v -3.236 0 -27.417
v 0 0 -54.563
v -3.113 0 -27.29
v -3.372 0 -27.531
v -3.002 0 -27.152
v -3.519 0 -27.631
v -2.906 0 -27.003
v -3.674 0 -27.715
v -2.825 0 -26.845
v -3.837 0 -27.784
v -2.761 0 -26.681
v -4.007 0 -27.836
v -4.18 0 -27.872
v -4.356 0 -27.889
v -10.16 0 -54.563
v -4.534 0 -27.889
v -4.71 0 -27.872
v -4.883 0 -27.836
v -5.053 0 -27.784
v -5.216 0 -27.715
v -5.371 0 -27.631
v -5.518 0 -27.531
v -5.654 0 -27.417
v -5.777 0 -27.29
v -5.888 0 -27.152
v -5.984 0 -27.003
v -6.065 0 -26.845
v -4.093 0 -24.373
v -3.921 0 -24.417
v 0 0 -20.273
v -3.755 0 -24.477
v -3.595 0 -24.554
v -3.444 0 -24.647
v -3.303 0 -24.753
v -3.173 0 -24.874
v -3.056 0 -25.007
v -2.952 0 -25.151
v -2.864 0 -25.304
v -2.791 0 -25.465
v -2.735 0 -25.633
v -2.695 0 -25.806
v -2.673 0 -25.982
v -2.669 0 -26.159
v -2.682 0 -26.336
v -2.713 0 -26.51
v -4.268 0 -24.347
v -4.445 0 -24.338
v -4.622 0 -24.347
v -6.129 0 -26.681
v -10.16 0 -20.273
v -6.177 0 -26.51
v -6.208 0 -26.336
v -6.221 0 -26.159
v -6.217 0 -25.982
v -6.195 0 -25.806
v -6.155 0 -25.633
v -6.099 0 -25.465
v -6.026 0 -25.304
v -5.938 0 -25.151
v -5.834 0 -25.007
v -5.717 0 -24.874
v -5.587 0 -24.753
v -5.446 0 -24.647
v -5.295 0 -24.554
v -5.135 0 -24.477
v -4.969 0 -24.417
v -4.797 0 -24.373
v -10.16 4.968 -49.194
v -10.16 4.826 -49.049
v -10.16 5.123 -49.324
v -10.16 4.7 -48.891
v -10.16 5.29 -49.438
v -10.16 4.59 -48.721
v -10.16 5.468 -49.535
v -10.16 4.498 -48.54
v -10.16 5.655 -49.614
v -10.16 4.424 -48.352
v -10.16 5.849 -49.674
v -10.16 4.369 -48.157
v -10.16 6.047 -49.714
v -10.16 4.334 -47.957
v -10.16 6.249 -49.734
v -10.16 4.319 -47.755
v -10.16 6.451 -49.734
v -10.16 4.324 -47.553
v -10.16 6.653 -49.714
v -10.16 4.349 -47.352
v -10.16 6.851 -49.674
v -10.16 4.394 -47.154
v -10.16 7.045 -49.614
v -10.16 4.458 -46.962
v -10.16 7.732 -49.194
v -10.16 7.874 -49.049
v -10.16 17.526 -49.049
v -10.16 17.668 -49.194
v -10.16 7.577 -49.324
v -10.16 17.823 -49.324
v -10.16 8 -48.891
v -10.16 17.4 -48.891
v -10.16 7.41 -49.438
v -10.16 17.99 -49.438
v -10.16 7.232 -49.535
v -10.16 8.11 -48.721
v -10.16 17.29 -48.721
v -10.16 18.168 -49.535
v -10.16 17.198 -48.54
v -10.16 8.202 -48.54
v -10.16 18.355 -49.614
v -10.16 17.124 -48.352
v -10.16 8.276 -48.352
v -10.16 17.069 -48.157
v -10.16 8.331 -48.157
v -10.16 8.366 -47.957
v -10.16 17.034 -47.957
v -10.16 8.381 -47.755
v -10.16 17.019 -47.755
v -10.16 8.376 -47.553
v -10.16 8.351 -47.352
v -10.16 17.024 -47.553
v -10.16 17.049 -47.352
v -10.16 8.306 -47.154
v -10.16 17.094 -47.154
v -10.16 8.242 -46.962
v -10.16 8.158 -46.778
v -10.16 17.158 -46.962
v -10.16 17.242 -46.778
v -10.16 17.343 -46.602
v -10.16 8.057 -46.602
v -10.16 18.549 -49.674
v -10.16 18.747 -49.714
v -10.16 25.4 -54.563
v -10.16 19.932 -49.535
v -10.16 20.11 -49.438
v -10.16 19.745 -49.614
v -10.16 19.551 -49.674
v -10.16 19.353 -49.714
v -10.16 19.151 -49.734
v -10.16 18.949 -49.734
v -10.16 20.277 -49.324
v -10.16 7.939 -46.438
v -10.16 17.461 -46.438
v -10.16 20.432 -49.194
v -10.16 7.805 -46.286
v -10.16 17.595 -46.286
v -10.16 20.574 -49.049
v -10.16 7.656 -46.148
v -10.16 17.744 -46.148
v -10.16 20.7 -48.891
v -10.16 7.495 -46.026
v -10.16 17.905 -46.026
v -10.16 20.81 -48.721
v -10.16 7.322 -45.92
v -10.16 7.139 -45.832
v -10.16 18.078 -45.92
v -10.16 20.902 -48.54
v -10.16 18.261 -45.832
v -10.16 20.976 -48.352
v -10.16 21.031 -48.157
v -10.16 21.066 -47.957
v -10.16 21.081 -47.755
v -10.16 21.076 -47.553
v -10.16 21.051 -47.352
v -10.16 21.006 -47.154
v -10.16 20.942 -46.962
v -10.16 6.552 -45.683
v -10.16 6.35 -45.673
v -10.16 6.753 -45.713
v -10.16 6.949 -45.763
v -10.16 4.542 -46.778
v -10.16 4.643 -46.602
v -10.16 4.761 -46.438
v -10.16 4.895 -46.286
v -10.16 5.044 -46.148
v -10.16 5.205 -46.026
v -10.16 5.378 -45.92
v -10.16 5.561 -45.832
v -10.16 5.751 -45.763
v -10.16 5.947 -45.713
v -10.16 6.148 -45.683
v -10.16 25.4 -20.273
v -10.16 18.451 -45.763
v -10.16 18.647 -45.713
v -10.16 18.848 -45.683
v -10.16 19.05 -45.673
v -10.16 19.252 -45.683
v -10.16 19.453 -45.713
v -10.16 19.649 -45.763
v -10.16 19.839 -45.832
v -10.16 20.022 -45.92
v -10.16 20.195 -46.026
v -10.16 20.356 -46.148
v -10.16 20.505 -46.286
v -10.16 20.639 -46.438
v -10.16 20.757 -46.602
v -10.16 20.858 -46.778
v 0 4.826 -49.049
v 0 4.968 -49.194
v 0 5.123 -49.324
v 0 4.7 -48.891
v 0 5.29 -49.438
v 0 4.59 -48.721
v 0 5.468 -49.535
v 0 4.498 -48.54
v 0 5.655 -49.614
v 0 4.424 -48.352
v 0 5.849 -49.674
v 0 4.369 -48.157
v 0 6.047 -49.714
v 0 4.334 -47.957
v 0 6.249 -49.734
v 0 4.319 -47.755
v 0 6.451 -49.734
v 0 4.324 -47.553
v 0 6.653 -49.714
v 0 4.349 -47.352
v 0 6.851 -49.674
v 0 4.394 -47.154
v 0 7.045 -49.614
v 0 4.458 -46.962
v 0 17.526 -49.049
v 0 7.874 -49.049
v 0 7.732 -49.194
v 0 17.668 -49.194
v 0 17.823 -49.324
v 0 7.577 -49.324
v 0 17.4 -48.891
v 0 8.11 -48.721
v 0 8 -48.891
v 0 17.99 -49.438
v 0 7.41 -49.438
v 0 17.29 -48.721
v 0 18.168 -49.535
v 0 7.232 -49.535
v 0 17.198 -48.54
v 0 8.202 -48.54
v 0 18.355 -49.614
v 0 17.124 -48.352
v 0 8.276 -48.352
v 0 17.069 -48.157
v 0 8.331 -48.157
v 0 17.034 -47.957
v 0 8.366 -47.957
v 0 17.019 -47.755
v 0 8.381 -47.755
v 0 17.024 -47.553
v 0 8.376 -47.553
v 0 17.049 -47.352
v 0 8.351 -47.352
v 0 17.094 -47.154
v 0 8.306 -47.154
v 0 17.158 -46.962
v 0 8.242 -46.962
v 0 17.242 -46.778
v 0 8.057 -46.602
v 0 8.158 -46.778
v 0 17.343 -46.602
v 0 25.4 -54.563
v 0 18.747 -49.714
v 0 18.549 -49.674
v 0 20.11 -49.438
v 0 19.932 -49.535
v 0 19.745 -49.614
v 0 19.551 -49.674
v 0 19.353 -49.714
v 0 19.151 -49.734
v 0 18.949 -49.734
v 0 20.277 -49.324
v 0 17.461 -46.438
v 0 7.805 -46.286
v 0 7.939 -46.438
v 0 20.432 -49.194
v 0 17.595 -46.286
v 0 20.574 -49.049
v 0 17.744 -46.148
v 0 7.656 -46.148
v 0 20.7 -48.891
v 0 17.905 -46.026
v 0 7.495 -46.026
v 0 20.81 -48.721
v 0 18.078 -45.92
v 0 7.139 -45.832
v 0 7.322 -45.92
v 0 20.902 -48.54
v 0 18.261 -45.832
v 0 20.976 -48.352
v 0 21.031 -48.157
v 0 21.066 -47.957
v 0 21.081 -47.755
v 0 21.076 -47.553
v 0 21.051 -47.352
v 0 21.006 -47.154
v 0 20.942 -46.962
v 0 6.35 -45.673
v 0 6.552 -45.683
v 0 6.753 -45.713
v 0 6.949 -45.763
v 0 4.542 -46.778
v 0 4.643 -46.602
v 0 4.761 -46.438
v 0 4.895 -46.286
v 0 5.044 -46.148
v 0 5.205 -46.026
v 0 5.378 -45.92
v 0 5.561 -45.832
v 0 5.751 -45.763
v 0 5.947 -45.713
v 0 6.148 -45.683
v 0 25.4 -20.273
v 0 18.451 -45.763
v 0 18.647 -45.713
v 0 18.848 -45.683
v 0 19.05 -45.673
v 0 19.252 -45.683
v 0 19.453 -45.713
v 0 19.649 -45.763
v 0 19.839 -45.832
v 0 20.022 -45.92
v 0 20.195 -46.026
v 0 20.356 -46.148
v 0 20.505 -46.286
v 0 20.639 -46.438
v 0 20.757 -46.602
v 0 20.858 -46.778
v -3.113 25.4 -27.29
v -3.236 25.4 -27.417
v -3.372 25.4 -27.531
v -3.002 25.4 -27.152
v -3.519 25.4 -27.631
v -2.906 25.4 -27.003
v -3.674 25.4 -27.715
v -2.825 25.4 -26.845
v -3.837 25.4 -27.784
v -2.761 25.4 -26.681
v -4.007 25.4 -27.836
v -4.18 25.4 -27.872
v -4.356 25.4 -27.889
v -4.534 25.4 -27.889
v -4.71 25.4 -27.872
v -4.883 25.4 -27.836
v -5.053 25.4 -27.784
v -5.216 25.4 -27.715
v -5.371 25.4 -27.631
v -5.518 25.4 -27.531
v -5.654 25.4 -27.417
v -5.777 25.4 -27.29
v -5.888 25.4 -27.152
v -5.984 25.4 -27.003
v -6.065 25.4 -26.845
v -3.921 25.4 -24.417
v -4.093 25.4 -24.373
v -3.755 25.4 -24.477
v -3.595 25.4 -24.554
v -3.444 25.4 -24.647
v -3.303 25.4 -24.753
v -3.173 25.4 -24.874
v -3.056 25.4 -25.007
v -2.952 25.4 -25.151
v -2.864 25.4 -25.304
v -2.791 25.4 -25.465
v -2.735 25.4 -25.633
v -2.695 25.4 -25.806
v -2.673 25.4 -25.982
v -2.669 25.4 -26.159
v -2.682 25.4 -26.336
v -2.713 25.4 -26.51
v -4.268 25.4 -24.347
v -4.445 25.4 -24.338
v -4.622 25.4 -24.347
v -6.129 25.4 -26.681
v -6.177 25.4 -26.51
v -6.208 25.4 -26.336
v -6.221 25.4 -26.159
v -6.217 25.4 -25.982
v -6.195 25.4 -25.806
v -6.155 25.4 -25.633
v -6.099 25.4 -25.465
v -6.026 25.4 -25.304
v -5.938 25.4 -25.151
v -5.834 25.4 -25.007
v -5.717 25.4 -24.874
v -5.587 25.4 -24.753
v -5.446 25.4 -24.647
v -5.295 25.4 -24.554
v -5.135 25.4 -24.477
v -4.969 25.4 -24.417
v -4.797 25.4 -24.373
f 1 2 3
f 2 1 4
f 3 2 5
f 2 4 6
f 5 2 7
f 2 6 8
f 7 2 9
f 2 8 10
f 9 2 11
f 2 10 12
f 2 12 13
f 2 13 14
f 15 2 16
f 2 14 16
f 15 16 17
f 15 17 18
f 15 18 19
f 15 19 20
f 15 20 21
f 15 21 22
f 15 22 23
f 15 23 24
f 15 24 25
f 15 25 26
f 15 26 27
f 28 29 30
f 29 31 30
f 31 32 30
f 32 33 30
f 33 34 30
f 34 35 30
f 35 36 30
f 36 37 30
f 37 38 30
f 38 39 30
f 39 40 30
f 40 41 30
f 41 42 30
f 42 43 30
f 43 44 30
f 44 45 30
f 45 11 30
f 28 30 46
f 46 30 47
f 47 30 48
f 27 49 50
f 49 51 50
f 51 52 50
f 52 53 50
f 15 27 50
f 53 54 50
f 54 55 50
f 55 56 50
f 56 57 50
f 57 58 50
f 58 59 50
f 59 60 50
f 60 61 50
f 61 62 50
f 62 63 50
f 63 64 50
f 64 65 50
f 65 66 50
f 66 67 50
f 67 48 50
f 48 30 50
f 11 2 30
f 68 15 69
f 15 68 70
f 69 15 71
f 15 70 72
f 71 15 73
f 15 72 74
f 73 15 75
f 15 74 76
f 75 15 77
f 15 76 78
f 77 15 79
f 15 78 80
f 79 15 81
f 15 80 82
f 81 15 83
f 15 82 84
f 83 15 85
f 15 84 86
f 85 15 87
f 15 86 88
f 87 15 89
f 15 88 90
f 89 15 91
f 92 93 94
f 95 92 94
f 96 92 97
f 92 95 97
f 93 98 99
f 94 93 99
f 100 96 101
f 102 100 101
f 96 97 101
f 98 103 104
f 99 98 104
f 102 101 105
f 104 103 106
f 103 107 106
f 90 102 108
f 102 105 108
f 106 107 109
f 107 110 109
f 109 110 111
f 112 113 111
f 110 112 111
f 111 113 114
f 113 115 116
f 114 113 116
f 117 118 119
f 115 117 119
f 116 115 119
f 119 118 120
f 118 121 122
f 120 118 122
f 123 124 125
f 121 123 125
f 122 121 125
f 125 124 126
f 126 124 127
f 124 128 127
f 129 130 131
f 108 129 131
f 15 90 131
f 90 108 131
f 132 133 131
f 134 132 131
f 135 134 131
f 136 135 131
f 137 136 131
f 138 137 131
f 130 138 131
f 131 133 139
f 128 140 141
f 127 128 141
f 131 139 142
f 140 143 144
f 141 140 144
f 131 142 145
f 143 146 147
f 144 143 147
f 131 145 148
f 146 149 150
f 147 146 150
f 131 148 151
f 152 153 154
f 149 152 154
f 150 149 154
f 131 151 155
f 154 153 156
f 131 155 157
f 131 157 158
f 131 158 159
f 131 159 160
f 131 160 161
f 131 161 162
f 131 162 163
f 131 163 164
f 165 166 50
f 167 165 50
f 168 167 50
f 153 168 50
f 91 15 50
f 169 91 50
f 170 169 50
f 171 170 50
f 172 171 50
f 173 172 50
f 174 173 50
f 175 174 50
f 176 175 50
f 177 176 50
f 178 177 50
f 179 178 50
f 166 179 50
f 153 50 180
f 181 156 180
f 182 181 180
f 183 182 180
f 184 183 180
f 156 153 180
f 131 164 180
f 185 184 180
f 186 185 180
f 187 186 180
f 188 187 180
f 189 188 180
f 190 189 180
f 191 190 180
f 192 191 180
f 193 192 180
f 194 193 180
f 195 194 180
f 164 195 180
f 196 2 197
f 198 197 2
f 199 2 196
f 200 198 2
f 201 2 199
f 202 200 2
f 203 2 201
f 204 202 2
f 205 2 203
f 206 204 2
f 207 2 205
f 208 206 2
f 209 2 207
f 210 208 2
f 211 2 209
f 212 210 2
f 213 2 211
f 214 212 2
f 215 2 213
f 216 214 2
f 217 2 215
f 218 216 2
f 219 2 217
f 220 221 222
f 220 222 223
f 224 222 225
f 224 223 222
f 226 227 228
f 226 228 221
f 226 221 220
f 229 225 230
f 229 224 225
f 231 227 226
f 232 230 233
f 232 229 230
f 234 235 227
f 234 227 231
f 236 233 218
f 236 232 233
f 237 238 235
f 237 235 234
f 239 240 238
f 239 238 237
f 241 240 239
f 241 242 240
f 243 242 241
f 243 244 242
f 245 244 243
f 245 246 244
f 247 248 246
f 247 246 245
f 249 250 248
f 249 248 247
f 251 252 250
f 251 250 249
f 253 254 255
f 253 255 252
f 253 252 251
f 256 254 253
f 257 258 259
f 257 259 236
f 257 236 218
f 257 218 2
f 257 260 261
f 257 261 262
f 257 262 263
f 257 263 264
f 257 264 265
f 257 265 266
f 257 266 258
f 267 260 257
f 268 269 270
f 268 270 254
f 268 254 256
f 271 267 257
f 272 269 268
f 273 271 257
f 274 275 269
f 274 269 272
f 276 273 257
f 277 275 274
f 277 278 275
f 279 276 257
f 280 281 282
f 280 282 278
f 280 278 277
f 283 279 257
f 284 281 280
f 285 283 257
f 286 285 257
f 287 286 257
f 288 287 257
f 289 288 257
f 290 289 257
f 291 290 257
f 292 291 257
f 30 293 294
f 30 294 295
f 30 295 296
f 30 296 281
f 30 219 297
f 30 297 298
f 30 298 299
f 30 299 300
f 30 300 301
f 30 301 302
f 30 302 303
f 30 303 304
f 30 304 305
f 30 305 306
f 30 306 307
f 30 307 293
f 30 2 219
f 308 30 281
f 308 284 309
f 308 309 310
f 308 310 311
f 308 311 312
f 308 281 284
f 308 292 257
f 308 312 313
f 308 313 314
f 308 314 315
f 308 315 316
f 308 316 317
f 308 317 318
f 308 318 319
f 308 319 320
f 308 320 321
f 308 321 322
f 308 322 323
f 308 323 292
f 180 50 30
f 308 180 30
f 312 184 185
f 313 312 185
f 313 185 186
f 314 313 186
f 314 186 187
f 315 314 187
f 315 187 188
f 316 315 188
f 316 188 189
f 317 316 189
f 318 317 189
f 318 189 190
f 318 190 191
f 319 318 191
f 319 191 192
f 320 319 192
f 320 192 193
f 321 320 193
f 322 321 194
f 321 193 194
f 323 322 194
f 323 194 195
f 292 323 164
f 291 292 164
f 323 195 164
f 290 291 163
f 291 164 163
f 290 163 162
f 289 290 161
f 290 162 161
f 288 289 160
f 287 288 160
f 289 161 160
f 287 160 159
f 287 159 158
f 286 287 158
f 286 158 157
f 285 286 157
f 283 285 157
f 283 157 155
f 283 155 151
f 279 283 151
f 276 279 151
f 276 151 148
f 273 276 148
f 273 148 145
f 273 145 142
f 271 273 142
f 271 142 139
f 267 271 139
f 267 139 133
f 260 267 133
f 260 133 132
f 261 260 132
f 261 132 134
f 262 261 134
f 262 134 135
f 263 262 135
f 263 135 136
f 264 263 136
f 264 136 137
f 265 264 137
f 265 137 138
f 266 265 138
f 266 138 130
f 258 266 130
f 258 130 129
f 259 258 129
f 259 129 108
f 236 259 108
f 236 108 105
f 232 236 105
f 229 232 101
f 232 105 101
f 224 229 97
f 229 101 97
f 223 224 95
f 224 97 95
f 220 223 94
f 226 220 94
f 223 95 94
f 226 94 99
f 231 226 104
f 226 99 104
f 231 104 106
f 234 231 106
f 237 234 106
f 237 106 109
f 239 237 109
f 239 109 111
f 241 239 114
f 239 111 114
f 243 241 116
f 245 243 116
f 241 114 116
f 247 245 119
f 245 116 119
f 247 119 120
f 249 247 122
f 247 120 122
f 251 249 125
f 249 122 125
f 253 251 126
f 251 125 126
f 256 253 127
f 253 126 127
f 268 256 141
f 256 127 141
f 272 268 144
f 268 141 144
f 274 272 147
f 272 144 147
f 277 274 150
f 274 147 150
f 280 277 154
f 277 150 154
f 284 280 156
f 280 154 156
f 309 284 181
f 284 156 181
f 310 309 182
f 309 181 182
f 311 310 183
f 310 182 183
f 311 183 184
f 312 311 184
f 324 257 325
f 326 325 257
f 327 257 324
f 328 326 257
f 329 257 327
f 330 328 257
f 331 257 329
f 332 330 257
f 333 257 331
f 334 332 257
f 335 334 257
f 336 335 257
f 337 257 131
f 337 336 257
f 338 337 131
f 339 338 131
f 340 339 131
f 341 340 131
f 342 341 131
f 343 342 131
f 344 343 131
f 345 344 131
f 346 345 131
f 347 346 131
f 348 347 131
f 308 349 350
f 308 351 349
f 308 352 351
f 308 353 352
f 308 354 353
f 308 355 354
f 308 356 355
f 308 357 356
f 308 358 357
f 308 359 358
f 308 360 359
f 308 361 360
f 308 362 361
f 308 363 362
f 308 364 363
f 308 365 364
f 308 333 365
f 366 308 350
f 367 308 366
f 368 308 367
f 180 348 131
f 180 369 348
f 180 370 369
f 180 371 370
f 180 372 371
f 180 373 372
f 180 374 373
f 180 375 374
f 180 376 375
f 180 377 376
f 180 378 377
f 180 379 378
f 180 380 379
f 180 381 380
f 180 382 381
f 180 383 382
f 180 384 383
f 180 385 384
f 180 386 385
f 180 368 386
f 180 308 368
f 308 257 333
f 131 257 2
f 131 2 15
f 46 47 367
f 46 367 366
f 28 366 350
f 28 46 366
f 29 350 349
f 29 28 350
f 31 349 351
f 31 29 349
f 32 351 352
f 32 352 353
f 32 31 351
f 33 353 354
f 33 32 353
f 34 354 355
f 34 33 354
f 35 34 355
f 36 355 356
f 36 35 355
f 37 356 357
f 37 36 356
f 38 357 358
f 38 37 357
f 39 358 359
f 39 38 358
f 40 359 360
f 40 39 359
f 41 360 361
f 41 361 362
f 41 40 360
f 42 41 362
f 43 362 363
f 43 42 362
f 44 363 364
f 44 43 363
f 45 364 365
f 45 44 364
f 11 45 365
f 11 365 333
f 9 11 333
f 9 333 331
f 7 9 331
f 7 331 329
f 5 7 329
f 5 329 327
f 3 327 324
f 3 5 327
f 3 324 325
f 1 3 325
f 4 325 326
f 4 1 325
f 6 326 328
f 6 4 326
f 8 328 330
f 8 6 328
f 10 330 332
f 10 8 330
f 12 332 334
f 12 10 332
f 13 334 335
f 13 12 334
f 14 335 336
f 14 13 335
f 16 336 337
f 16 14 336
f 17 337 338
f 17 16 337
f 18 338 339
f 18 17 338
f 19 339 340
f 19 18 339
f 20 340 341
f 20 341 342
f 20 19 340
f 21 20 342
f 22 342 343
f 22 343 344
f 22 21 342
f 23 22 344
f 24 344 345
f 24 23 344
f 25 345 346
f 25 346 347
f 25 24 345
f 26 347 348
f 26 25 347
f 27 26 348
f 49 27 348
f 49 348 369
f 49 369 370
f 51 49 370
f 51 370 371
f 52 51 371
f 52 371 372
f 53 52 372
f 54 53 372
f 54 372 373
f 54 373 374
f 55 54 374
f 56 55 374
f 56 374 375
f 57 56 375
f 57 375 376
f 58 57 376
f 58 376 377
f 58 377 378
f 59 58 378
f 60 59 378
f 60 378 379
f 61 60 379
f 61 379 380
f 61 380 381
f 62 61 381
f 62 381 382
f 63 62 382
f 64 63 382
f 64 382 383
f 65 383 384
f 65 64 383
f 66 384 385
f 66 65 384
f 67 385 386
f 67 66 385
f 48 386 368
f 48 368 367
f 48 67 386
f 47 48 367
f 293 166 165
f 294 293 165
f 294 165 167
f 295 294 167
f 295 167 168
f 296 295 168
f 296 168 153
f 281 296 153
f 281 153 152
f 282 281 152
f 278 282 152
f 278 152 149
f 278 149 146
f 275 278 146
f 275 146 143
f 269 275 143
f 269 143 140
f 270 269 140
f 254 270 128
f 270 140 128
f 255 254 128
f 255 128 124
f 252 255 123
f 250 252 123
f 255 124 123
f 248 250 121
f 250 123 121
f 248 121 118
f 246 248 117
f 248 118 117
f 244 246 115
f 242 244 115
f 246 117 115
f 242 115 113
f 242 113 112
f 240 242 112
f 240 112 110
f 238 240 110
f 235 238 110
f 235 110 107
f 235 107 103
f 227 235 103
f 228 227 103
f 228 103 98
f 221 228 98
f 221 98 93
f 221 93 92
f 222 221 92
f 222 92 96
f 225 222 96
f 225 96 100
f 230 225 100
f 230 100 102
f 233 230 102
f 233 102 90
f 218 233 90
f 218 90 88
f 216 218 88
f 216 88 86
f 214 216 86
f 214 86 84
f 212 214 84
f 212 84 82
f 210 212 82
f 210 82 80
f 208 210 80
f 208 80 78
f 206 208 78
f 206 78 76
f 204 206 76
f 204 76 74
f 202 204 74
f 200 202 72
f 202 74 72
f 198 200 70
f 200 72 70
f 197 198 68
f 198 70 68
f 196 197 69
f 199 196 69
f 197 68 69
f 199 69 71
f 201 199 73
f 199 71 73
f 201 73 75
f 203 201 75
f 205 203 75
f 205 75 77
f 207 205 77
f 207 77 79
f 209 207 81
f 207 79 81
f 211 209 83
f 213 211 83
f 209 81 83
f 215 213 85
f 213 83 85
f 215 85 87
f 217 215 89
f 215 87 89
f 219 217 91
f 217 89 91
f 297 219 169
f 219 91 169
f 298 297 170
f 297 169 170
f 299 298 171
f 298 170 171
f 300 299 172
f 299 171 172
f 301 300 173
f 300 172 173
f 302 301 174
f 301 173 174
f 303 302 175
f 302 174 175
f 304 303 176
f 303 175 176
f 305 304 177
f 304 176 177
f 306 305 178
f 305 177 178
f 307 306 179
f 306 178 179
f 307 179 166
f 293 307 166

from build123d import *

# Parameters (mm, degrees)
SKETCH1_W           = 10.16
SKETCH1_H           = 25.4
SKETCH1_R           = 1.776811913
BOSS_EXTRUDE1_DEPTH = 25.4
SKETCH2_W           = 10.16
SKETCH2_H           = 25.4
BOSS_EXTRUDE2_DEPTH = 5.08
SKETCH4_W           = 10.16
SKETCH4_H           = 25.4
BOSS_EXTRUDE3_DEPTH = 3.81
SKETCH3_R           = 2.032
CUT_EXTRUDE1_DEPTH  = 62.036581459


with BuildPart() as part:
    # Sketch1 → Boss-Extrude1 (new body)
    with BuildSketch(Plane(origin=(0, 0, 0), x_dir=(1, 0, 0), z_dir=(0, 1, 0))):
        with Locations((-5.08, 32.972612439)):
            Rectangle(SKETCH1_W, SKETCH1_H)
        with Locations(Location((-4.445, 26.114612439, 0), (0, 0, 270))):
            Circle(SKETCH1_R, mode=Mode.SUBTRACT)
    extrude(amount=BOSS_EXTRUDE1_DEPTH)

    # Sketch2 → Boss-Extrude2 (add)
    with BuildSketch(Plane(origin=(0, 0, -45.672612439), x_dir=(-1, 0, 0), z_dir=(0, 0, -1))):
        with Locations((5.08, 12.7)):
            Rectangle(SKETCH2_W, SKETCH2_H)
    extrude(amount=BOSS_EXTRUDE2_DEPTH)

    # Sketch4 → Boss-Extrude3 (add)
    with BuildSketch(Plane(origin=(0, 0, -50.752612439), x_dir=(-1, 0, 0), z_dir=(0, 0, -1))):
        with Locations((5.08, 12.7)):
            Rectangle(SKETCH4_W, SKETCH4_H)
    extrude(amount=BOSS_EXTRUDE3_DEPTH)

    # Sketch3 → Cut-Extrude1 (cut, through all)
    with BuildSketch(Plane.ZY.offset(10.16)):
        with Locations((-47.704612439, 19.05)):
            Circle(SKETCH3_R)
        with Locations((-47.704612439, 6.35)):
            Circle(SKETCH3_R)
    extrude(amount=-CUT_EXTRUDE1_DEPTH, mode=Mode.SUBTRACT)


solid = part.part
